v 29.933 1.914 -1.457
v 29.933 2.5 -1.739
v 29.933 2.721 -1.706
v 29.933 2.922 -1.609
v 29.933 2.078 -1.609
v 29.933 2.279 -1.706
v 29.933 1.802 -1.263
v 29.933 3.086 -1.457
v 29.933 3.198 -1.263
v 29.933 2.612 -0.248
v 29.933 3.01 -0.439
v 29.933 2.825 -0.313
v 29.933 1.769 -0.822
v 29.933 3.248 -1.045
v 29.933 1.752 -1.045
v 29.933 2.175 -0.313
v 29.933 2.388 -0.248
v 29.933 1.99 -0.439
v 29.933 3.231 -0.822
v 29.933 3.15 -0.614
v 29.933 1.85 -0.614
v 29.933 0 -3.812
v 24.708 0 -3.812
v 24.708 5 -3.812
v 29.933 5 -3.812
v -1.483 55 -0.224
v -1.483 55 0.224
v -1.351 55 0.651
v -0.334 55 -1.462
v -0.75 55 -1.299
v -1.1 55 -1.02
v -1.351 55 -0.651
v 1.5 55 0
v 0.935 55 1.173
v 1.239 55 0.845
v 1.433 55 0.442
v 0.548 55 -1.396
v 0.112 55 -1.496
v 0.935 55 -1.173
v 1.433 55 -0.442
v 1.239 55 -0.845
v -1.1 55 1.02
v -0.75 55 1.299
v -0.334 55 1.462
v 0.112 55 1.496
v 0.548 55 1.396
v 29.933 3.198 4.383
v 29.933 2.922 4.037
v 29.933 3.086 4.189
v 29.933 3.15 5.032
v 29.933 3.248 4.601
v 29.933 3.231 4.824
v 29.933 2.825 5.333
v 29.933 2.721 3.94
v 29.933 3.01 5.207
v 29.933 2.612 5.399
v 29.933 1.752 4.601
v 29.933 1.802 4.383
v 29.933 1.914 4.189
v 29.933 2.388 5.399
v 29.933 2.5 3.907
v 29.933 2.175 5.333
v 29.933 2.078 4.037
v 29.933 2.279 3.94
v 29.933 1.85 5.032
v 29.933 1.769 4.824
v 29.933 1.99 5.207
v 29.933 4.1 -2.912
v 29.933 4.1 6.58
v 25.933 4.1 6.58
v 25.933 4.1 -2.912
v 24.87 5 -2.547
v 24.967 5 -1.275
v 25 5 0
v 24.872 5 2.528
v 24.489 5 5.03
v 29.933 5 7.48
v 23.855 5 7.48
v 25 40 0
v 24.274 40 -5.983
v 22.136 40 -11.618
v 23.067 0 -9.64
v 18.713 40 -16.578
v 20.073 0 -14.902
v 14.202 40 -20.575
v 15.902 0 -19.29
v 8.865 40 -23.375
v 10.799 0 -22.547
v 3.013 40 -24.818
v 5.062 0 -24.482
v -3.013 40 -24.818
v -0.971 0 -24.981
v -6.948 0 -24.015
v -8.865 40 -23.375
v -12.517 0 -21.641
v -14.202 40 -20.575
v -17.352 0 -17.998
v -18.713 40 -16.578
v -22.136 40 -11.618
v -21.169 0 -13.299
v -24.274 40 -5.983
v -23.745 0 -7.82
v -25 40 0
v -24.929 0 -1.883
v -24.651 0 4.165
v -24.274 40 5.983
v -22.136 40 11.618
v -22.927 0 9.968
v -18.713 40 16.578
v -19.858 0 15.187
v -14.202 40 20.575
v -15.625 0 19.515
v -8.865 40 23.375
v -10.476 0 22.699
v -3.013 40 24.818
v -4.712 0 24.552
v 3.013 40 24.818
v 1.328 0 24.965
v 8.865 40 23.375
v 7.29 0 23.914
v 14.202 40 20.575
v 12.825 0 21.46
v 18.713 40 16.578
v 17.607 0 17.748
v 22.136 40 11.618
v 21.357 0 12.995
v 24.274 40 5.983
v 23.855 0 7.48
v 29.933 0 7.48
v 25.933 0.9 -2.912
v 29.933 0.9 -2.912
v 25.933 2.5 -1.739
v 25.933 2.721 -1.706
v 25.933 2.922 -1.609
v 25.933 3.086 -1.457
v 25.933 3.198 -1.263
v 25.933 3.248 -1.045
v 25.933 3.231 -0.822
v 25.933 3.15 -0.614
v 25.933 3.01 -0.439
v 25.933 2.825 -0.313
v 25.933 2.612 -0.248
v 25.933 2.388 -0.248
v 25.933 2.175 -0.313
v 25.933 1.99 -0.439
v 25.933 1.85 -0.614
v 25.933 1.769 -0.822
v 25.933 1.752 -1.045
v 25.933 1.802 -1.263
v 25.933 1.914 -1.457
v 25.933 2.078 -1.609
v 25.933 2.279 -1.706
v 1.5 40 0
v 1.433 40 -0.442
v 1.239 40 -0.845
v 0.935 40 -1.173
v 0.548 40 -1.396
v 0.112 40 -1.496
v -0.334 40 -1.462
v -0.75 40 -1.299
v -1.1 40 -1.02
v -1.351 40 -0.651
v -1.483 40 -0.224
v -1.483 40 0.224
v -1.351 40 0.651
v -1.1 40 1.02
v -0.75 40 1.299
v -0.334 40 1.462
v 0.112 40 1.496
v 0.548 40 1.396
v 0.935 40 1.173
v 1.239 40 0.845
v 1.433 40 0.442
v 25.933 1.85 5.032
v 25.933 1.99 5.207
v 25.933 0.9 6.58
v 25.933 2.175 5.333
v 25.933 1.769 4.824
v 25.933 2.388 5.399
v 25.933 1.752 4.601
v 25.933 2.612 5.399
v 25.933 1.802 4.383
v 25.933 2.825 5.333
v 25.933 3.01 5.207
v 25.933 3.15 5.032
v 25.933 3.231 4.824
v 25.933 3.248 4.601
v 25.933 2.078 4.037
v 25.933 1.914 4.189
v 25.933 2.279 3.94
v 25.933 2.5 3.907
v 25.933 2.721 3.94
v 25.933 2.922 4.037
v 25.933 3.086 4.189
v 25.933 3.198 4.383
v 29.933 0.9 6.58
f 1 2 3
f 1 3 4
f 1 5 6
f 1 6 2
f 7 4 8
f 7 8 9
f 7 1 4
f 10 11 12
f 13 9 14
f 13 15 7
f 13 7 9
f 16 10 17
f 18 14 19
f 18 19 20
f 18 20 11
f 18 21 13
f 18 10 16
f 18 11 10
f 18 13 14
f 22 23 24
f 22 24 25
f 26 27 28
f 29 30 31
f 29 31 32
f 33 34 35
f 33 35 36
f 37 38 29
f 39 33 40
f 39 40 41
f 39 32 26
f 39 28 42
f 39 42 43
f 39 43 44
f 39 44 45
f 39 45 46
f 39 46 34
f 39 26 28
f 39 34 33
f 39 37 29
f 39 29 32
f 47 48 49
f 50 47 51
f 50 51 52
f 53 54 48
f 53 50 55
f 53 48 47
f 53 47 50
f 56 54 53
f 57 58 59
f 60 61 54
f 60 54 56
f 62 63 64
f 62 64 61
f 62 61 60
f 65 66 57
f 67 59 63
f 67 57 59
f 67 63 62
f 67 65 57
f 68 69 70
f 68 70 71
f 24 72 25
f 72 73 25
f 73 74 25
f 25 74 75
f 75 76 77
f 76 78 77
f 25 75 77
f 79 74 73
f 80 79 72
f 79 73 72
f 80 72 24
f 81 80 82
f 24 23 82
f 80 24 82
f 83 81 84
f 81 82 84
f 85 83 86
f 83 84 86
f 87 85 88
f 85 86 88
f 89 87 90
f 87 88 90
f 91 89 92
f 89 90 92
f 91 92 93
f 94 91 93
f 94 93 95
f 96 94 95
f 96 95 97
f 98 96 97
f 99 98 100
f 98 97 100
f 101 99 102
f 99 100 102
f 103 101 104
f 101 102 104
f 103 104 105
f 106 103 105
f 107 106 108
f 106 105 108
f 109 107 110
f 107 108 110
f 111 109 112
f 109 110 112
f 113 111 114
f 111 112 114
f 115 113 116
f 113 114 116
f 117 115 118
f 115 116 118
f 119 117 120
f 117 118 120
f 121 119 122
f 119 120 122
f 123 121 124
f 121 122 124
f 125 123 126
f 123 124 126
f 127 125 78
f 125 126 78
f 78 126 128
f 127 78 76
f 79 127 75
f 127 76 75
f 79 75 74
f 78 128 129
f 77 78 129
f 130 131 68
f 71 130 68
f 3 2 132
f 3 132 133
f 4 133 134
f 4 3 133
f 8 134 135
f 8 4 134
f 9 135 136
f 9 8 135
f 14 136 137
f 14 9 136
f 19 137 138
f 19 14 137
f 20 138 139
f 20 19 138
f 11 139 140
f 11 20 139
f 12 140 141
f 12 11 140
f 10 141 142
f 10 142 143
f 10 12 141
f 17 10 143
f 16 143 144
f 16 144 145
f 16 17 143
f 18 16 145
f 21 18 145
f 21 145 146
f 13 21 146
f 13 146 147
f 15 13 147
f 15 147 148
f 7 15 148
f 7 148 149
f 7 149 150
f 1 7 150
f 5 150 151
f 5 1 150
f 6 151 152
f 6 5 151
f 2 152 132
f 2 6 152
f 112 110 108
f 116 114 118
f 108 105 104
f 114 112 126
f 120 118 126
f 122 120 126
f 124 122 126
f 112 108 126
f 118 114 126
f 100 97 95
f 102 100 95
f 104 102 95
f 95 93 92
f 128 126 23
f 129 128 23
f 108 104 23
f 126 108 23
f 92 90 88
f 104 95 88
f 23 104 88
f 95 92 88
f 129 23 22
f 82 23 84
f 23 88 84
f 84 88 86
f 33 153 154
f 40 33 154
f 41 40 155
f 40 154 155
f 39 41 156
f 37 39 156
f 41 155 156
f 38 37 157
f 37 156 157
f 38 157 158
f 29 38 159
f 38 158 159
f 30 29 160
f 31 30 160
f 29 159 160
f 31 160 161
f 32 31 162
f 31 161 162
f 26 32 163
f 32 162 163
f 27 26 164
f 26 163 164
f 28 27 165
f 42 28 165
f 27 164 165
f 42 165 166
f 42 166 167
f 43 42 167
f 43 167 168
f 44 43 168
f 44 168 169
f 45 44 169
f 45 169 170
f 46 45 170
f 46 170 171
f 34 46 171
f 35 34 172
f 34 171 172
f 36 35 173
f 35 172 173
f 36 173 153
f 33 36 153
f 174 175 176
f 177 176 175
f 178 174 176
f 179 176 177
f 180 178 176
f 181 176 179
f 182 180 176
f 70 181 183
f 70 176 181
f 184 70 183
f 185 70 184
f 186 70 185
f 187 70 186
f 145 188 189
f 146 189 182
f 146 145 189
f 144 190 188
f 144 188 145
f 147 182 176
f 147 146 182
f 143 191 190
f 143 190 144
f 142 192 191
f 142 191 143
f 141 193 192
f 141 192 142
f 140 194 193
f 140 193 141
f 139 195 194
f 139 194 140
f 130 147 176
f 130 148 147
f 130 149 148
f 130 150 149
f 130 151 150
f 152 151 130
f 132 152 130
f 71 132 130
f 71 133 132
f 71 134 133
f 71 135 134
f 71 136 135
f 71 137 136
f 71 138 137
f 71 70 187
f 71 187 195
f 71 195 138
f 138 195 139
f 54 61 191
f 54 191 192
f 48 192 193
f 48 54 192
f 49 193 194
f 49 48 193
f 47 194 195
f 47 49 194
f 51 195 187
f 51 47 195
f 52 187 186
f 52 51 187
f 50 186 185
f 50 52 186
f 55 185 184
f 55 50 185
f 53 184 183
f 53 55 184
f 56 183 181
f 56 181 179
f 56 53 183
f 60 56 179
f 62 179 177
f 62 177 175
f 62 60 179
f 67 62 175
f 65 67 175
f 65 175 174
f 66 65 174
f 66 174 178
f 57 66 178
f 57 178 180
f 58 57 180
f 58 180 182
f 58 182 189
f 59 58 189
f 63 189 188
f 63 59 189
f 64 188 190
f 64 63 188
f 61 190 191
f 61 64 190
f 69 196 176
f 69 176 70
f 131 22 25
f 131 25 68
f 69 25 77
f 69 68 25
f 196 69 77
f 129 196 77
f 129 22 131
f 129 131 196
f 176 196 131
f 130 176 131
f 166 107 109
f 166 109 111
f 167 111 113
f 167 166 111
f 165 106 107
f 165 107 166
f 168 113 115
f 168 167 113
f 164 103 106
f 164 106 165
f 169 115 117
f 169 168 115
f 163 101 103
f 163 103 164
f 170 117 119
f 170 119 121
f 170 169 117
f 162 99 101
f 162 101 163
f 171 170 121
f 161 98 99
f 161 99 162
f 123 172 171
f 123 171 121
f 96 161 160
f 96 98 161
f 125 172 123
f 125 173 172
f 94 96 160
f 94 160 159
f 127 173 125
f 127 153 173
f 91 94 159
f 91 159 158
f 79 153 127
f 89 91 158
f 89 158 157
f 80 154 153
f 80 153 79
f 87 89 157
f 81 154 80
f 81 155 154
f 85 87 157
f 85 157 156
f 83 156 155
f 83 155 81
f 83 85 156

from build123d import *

# Parameters (mm, degrees)
SKETCH1_R           = 25
BOSS_EXTRUDE1_DEPTH = 40
SKETCH2_R           = 1.5
BOSS_EXTRUDE2_DEPTH = 15
SKETCH3_W           = 10
SKETCH3_H           = 11.292423953
BOSS_EXTRUDE3_DEPTH = 5
SKETCH4_W           = 9.492423953
SKETCH4_H           = 3.2
SKETCH4_R           = 0.75
CUT_EXTRUDE1_DEPTH  = 4


with BuildPart() as part:
    # Sketch1 → Boss-Extrude1 (new body)
    with BuildSketch(Plane(origin=(0, 0, 0), x_dir=(1, 0, 0), z_dir=(0, 1, 0))):
        Circle(SKETCH1_R)
    extrude(amount=BOSS_EXTRUDE1_DEPTH)

    # Sketch2 → Boss-Extrude2 (add)
    with BuildSketch(Plane(origin=(0, 40, 0), x_dir=(1, 0, 0), z_dir=(0, 1, 0))):
        Circle(SKETCH2_R)
    extrude(amount=BOSS_EXTRUDE2_DEPTH)

    # Sketch3 → Boss-Extrude3 (add)
    with BuildSketch(Plane.XZ):
        with Locations((24.932644211, 1.833917291)):
            Rectangle(SKETCH3_W, SKETCH3_H)
    extrude(amount=-BOSS_EXTRUDE3_DEPTH)

    # Sketch4 → Cut-Extrude1 (cut)
    with BuildSketch(Plane(origin=(29.932644211, 0, 0), x_dir=(0, 0, -1), z_dir=(1, 0, 0))):
        with Locations((-1.833917291, 2.5)):
            Rectangle(SKETCH4_W, SKETCH4_H)
        with Locations((-4.657023279, 2.5)):
            Circle(SKETCH4_R, mode=Mode.SUBTRACT)
        with Locations((0.989188698, 2.5)):
            Circle(SKETCH4_R, mode=Mode.SUBTRACT)
    extrude(amount=-CUT_EXTRUDE1_DEPTH, mode=Mode.SUBTRACT)


solid = part.part
